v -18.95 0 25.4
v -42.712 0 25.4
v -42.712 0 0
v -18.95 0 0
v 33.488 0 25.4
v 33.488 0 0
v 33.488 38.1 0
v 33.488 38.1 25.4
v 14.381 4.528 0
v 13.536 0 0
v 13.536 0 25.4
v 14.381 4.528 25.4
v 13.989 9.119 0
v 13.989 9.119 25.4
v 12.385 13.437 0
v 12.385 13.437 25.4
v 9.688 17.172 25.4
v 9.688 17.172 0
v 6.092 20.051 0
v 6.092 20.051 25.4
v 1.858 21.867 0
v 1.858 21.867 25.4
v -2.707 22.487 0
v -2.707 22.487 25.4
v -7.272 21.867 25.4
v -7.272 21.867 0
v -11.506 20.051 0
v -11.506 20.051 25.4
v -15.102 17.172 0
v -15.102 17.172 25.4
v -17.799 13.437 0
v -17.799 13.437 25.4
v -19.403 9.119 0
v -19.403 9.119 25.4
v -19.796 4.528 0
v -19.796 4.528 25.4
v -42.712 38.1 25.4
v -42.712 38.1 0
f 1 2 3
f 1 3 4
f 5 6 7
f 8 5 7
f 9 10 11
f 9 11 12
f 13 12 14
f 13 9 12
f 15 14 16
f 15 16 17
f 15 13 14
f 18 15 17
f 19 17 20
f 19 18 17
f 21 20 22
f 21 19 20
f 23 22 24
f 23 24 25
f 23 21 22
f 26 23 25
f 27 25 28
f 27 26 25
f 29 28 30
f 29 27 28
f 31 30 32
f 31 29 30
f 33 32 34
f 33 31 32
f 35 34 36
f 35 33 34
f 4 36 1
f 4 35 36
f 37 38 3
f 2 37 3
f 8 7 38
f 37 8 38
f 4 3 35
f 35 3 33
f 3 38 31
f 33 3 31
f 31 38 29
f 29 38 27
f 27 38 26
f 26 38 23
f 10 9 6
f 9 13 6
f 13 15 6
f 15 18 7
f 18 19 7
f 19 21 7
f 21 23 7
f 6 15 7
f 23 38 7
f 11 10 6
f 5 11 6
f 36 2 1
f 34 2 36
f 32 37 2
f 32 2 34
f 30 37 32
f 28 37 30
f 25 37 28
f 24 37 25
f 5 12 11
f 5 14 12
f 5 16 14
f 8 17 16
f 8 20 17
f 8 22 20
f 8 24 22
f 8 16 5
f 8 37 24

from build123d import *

# Parameters (mm, degrees)
F1_DEPTH = 25.4
F2_DEPTH = 25.4


with BuildPart() as f1:
    # F0 (on Top) → F1 (new body)
    with BuildSketch(Plane.XY):
        with BuildLine():
            Line((33.487893, 38.1), (-42.712107, 38.1))
            Line((-42.712107, 38.1), (-42.712107, 0))
            Line((-42.712107, 0), (-18.949738, 0))
            ThreePointArc((-18.949738, 0), (-2.707106, 22.487095), (13.535526, 0))
            Line((13.535526, 0), (33.487893, 0))
            Line((33.487893, 0), (33.487893, 38.1))
        make_face()
        with BuildLine():
            ThreePointArc((13.535526, 0), (-2.707106, 22.487095), (-18.949738, 0))
            Line((-18.949738, 0), (13.535526, 0))
        make_face()
    extrude(amount=F1_DEPTH)

    # F0 (on Top) → F2 (cut)
    with BuildSketch(Plane.XY):
        with BuildLine():
            ThreePointArc((13.535526, 0), (-2.707106, 22.487095), (-18.949738, 0))
            Line((-18.949738, 0), (13.535526, 0))
        make_face()
    extrude(amount=F2_DEPTH, mode=Mode.SUBTRACT)


solid = f1.part
